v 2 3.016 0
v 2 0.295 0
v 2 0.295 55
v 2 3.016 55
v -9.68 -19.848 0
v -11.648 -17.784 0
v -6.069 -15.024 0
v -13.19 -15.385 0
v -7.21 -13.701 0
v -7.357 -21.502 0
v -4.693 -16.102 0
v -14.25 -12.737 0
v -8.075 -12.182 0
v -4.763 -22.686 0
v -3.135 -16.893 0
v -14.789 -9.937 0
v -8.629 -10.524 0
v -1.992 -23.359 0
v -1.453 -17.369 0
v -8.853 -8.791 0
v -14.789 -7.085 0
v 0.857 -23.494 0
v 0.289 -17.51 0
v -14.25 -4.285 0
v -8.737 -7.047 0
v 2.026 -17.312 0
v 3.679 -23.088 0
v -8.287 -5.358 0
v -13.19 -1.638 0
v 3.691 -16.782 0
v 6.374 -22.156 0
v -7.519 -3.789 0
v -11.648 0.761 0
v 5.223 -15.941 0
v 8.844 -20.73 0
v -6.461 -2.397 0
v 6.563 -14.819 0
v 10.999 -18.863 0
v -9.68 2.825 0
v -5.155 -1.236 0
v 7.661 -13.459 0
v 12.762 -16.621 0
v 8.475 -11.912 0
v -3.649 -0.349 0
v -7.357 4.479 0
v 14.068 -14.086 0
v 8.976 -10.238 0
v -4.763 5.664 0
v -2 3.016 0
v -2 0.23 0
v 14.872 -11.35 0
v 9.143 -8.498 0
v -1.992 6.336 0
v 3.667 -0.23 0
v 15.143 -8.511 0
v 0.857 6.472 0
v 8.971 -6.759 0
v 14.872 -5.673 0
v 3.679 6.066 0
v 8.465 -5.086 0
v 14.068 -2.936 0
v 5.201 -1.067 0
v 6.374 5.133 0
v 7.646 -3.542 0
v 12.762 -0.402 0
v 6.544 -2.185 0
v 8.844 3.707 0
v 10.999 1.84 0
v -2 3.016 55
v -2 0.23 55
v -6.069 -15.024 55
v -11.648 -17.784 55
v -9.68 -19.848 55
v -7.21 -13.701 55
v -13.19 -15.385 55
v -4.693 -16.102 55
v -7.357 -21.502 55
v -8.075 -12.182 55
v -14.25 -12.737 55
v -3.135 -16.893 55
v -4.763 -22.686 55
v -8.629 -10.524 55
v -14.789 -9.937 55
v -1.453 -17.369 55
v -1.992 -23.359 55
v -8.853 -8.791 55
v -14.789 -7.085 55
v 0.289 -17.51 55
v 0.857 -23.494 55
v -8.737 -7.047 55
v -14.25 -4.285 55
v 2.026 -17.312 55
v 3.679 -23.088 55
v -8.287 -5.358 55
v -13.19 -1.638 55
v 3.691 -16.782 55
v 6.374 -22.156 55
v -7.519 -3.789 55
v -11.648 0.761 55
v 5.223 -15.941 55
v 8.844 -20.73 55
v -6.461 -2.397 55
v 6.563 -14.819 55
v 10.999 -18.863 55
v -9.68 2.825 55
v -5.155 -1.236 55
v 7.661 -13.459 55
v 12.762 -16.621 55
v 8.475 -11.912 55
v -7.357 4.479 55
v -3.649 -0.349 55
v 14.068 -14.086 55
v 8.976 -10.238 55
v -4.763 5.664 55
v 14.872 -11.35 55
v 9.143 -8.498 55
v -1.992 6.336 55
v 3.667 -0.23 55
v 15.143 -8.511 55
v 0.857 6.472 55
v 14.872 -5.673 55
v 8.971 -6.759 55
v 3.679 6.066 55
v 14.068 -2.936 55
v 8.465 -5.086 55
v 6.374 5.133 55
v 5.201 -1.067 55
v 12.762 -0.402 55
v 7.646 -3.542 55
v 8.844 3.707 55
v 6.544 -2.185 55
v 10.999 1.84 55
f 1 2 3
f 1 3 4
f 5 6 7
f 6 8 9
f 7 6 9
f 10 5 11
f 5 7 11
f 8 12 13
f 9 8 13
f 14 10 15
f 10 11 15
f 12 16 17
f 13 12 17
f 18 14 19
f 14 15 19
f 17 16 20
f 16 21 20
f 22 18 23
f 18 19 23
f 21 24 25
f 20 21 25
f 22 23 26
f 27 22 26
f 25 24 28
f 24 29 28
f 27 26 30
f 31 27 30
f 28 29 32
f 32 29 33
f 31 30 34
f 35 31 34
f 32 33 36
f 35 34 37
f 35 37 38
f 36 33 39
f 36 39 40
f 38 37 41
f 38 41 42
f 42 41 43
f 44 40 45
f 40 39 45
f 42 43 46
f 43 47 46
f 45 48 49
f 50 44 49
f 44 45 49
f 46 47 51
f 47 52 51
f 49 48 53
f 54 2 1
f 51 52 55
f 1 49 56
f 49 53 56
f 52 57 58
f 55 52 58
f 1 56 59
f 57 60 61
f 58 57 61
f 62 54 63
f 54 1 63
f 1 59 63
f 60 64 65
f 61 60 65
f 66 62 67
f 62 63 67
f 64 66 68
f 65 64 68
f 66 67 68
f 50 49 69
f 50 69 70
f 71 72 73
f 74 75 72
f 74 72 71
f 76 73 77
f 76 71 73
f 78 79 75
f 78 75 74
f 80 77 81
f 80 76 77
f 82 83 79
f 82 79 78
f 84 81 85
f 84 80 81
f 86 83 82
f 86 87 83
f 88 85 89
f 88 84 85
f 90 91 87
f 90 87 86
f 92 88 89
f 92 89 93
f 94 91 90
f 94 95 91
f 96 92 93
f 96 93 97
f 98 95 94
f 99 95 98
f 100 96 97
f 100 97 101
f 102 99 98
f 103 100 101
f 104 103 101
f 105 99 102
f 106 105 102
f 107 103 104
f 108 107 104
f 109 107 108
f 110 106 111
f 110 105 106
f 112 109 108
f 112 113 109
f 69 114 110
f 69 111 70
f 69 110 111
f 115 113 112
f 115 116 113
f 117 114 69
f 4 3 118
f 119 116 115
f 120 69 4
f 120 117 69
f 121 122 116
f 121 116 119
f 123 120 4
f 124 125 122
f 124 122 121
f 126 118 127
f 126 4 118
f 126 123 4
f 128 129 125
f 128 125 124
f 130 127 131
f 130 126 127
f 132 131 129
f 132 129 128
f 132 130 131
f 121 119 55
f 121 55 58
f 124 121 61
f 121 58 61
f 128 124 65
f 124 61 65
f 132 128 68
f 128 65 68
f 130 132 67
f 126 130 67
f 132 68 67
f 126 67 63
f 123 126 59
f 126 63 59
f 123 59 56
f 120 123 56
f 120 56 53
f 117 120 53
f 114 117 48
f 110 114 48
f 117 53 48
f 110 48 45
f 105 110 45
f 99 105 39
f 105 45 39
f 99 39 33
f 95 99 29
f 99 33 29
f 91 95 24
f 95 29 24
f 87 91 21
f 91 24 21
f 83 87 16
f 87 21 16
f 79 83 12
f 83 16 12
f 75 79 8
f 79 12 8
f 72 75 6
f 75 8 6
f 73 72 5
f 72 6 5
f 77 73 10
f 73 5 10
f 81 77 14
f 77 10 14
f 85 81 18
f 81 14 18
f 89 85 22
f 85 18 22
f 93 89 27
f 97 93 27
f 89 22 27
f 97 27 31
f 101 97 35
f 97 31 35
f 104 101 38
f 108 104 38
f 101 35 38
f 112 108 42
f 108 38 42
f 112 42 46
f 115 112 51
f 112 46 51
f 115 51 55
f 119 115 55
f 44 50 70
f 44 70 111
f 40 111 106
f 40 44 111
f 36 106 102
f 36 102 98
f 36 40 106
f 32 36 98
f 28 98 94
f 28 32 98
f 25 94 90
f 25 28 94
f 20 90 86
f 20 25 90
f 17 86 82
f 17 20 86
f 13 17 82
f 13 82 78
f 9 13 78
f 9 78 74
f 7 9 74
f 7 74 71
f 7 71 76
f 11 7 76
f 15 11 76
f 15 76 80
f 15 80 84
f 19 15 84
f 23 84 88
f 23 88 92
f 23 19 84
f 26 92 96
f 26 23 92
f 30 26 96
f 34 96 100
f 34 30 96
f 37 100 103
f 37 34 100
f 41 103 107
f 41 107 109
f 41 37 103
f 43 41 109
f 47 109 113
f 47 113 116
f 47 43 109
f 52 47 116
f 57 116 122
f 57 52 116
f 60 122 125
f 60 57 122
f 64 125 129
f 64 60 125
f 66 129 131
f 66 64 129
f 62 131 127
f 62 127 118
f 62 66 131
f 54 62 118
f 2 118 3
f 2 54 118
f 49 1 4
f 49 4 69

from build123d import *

# Parameters (mm, degrees)
SKETCH1_R           = 15
BOSS_EXTRUDE1_DEPTH = 55


with BuildPart() as part:
    # Sketch1 → Boss-Extrude1 (new body)
    with BuildSketch(Plane.XY):
        with Locations((0.142780768, -8.511321707)):
            Circle(SKETCH1_R)
        with BuildLine():
            Line((2, 3.016416073), (-2, 3.016416073))
            Line((-2, 3.016416073), (-2, 0.229873324))
            ThreePointArc((-2, 0.229873324), (0.289224182, -17.510130202), (2, 0.294967904))
            Line((2, 0.294967904), (2, 3.016416073))
        make_face(mode=Mode.SUBTRACT)
    extrude(amount=BOSS_EXTRUDE1_DEPTH)


solid = part.part
